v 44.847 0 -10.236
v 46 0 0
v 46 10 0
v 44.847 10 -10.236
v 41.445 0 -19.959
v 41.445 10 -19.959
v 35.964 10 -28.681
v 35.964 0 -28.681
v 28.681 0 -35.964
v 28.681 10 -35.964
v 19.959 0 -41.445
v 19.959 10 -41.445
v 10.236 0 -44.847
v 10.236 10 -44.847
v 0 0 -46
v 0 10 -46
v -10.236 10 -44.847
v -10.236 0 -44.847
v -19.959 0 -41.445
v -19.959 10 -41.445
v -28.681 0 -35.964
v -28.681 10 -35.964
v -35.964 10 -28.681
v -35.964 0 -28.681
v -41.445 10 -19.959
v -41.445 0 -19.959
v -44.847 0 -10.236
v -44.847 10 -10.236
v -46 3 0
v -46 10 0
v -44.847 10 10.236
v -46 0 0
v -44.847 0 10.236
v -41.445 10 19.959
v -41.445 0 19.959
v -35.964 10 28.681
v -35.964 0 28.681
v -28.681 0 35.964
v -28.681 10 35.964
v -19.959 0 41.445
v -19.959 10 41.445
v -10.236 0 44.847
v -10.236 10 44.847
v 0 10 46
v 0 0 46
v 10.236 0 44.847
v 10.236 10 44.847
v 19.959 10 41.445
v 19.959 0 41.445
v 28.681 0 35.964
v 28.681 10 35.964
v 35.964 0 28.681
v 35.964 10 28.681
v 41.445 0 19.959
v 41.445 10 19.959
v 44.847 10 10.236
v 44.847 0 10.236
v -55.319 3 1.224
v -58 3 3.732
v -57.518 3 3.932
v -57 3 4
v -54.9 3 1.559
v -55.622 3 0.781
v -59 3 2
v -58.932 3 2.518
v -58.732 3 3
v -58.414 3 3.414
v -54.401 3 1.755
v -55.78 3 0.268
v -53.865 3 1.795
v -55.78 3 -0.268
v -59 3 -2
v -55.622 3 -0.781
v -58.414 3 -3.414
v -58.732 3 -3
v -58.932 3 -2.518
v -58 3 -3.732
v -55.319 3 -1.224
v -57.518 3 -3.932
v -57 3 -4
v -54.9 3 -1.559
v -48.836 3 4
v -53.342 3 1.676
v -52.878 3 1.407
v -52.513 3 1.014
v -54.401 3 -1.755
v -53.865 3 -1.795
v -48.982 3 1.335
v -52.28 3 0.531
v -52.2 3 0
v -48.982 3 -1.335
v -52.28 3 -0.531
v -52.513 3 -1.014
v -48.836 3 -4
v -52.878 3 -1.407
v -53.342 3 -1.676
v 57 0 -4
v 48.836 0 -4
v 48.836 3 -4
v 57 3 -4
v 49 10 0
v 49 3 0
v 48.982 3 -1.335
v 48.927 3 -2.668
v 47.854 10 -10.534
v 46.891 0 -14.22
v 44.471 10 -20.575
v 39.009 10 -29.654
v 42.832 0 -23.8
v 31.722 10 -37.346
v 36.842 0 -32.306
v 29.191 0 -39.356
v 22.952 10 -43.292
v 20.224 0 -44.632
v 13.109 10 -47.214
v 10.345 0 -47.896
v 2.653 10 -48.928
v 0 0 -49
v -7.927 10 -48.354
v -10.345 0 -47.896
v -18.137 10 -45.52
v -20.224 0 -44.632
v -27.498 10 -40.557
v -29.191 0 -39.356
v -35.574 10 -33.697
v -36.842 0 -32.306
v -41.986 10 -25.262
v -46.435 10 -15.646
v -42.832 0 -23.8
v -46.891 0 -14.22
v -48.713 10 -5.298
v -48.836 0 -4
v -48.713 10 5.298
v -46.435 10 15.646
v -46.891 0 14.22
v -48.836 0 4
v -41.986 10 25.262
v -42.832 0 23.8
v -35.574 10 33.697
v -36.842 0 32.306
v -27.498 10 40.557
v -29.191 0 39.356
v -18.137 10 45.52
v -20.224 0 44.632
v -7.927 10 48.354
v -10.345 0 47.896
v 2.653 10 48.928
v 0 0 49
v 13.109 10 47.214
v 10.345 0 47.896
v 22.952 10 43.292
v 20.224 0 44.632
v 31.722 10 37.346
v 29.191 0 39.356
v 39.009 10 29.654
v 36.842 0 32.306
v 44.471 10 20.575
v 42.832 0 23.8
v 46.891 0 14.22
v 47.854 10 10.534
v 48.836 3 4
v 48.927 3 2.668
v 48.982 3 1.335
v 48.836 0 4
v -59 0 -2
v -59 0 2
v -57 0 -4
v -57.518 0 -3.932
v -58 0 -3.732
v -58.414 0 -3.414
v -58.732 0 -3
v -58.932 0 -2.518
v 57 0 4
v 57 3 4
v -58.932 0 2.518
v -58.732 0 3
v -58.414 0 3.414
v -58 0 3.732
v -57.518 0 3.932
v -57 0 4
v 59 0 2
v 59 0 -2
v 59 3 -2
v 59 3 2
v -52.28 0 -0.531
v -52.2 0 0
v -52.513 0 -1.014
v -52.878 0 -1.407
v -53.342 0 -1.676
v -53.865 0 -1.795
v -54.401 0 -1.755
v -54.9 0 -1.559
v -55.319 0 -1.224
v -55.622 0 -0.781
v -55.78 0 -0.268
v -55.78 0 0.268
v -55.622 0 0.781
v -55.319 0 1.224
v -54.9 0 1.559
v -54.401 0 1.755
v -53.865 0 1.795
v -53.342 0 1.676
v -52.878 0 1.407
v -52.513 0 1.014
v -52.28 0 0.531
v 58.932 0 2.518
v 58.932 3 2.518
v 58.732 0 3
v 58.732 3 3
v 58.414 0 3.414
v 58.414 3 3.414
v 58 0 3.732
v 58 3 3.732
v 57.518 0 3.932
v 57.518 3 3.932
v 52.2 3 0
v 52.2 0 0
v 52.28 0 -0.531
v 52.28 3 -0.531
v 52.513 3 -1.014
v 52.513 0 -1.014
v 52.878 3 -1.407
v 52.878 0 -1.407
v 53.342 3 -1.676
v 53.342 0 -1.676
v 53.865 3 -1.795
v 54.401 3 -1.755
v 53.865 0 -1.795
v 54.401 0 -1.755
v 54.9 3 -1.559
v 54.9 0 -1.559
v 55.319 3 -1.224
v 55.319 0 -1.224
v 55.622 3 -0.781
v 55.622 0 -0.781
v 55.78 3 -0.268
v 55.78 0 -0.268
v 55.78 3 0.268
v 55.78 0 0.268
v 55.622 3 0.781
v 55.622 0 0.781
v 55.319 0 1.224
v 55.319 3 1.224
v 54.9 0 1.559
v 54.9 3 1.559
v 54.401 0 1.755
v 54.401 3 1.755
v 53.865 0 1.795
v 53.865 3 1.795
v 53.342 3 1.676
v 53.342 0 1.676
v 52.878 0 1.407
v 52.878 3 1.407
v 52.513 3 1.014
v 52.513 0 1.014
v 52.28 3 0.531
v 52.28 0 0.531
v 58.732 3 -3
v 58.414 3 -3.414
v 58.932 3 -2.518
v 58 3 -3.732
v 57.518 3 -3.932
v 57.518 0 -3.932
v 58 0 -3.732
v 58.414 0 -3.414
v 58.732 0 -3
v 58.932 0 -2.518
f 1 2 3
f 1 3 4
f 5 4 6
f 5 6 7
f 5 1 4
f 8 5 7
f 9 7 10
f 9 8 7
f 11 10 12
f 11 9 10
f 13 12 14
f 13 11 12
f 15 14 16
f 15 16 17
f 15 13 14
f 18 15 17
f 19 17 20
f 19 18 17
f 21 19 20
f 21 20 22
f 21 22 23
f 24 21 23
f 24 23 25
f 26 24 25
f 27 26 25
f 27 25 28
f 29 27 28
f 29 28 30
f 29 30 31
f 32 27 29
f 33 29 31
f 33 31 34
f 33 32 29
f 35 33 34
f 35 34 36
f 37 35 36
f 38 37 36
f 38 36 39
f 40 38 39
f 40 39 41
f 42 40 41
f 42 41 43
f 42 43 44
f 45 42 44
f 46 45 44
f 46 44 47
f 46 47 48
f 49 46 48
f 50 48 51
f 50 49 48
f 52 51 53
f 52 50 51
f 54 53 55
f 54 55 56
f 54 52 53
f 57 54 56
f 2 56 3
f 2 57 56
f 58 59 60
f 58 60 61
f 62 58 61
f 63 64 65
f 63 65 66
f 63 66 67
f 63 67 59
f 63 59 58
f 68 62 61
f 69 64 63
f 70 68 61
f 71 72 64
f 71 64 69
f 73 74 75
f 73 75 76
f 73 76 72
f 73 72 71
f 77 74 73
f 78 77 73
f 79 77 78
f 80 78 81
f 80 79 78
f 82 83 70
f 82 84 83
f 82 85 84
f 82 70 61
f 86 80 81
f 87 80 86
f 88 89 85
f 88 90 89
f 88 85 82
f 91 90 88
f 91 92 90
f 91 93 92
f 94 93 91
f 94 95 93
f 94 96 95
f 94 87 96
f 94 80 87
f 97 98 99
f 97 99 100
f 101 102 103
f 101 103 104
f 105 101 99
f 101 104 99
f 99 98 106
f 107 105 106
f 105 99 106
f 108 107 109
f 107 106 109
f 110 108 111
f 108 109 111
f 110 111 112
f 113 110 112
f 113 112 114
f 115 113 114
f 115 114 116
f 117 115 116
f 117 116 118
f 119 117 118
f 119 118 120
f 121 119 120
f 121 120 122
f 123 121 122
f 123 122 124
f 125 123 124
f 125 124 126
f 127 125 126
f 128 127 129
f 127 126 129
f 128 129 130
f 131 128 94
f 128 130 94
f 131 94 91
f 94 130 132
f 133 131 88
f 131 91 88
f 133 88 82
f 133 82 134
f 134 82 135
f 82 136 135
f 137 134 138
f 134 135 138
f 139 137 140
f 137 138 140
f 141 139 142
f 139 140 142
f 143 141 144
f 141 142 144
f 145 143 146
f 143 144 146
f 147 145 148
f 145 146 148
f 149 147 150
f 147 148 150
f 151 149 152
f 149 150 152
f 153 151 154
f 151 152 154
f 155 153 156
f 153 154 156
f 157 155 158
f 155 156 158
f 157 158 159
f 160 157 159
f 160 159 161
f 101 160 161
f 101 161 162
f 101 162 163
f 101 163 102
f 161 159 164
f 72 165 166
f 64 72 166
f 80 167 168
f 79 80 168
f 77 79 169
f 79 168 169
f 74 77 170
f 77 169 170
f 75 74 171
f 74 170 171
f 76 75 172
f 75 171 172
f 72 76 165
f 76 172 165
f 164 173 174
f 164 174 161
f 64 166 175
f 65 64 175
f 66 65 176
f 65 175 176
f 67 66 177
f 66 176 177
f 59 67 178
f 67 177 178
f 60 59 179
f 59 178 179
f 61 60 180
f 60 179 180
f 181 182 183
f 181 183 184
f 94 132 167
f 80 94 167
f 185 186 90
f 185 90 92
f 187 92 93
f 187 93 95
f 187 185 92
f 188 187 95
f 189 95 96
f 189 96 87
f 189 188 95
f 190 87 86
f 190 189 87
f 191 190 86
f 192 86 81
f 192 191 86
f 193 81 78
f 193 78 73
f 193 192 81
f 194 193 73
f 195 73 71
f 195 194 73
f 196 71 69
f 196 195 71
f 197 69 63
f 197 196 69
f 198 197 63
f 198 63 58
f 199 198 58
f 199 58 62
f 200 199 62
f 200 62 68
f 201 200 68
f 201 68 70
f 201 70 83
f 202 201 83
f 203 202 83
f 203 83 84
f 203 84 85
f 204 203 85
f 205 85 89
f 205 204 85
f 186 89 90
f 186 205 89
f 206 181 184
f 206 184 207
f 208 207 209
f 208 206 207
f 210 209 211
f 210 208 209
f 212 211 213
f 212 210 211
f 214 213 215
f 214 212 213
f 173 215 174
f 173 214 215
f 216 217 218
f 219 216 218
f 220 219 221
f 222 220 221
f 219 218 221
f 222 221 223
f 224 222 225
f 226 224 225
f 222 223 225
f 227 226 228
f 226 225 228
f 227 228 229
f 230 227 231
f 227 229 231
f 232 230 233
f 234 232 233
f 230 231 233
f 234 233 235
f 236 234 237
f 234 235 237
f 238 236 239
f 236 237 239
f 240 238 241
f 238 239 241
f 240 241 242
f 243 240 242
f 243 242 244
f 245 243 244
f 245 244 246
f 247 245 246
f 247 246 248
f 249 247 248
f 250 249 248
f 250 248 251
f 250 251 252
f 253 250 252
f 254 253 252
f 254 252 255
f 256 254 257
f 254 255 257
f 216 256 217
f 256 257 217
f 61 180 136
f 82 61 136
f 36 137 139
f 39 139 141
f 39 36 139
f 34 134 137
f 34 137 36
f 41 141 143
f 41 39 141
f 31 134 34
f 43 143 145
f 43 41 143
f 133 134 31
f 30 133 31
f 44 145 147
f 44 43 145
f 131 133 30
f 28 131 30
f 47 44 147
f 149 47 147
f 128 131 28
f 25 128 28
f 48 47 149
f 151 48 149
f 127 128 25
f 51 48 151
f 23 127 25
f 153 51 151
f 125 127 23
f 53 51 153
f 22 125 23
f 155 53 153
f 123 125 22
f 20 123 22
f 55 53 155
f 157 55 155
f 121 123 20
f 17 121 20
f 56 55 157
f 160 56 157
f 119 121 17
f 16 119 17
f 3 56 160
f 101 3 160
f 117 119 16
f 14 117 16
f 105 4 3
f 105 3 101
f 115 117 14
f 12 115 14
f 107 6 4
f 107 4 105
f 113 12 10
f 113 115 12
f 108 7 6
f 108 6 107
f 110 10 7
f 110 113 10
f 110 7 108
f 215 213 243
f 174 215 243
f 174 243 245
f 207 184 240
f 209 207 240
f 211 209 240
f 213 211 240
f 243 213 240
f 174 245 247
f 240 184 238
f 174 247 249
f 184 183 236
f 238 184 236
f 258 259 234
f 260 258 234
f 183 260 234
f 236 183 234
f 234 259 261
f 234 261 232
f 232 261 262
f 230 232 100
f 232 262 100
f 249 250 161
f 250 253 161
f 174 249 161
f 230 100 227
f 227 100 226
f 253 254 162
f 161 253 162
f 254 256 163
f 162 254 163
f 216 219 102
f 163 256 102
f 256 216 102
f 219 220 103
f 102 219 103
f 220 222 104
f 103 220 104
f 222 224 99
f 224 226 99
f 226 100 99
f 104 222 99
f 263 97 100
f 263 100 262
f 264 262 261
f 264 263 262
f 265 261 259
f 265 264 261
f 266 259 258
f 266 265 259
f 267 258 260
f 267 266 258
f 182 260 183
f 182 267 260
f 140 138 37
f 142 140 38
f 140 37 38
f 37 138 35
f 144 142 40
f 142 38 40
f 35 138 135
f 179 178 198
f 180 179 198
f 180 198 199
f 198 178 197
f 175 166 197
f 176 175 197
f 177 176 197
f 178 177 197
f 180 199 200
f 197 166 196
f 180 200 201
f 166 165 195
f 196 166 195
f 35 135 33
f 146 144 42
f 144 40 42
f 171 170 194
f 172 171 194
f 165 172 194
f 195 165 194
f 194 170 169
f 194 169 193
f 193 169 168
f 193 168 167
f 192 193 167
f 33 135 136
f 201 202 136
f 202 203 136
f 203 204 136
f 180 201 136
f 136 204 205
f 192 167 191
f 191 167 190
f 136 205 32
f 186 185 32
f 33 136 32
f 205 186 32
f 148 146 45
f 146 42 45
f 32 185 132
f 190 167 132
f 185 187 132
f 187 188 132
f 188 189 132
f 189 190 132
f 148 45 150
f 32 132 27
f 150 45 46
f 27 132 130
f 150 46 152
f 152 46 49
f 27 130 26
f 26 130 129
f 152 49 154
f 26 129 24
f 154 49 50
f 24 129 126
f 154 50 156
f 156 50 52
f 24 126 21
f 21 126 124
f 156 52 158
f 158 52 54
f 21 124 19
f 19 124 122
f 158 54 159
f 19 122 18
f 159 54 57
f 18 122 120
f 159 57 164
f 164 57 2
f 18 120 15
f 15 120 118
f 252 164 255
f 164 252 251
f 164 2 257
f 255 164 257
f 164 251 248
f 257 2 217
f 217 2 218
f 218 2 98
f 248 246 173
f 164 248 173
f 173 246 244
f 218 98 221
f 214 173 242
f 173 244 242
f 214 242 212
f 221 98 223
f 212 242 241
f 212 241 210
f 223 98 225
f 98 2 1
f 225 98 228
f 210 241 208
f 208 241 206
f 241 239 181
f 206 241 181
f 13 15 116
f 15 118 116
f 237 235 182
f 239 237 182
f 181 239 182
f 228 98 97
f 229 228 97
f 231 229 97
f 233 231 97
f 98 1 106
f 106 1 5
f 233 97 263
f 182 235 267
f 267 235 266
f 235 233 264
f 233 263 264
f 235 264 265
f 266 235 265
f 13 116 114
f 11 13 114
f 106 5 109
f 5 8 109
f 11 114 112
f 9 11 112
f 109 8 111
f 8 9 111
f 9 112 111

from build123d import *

# Parameters (mm, degrees)
SKETCH1_R           = 49
SKETCH1_R_2         = 46
BOSS_EXTRUDE1_DEPTH = 10
SKETCH2_R           = 1.8
BOSS_EXTRUDE2_DEPTH = 3


with BuildPart() as part:
    # Sketch1 → Boss-Extrude1 (new body)
    with BuildSketch(Plane(origin=(0, 0, 0), x_dir=(1, 0, 0), z_dir=(0, 1, 0))):
        Circle(SKETCH1_R)
        Circle(SKETCH1_R_2, mode=Mode.SUBTRACT)
    extrude(amount=BOSS_EXTRUDE1_DEPTH)

    # Sketch2 → Boss-Extrude2 (add)
    with BuildSketch(Plane(origin=(0, 0, 0), x_dir=(1, 0, 0), z_dir=(0, 1, 0))):
        with BuildLine():
            Line((-46, 0), (-46, 4))
            Line((-46, 4), (-57, 4))
            ThreePointArc((-57, 4), (-58.414213562, 3.414213562), (-59, 2))
            Line((-59, 2), (-59, -2))
            ThreePointArc((-59, -2), (-58.414213562, -3.414213562), (-57, -4))
            Line((-57, -4), (-46, -4))
            Line((-46, -4), (-46, 0))
        make_face()
        with Locations((-54, 0)):
            Circle(SKETCH2_R, mode=Mode.SUBTRACT)
    boss_extrude2 = extrude(amount=BOSS_EXTRUDE2_DEPTH)

    # Mirror1: Boss-Extrude2 across plane
    add(boss_extrude2.mirror(Plane(origin=(0, 0, 0), x_dir=(0, 0, 1), z_dir=(1, 0, 0))))


solid = part.part
